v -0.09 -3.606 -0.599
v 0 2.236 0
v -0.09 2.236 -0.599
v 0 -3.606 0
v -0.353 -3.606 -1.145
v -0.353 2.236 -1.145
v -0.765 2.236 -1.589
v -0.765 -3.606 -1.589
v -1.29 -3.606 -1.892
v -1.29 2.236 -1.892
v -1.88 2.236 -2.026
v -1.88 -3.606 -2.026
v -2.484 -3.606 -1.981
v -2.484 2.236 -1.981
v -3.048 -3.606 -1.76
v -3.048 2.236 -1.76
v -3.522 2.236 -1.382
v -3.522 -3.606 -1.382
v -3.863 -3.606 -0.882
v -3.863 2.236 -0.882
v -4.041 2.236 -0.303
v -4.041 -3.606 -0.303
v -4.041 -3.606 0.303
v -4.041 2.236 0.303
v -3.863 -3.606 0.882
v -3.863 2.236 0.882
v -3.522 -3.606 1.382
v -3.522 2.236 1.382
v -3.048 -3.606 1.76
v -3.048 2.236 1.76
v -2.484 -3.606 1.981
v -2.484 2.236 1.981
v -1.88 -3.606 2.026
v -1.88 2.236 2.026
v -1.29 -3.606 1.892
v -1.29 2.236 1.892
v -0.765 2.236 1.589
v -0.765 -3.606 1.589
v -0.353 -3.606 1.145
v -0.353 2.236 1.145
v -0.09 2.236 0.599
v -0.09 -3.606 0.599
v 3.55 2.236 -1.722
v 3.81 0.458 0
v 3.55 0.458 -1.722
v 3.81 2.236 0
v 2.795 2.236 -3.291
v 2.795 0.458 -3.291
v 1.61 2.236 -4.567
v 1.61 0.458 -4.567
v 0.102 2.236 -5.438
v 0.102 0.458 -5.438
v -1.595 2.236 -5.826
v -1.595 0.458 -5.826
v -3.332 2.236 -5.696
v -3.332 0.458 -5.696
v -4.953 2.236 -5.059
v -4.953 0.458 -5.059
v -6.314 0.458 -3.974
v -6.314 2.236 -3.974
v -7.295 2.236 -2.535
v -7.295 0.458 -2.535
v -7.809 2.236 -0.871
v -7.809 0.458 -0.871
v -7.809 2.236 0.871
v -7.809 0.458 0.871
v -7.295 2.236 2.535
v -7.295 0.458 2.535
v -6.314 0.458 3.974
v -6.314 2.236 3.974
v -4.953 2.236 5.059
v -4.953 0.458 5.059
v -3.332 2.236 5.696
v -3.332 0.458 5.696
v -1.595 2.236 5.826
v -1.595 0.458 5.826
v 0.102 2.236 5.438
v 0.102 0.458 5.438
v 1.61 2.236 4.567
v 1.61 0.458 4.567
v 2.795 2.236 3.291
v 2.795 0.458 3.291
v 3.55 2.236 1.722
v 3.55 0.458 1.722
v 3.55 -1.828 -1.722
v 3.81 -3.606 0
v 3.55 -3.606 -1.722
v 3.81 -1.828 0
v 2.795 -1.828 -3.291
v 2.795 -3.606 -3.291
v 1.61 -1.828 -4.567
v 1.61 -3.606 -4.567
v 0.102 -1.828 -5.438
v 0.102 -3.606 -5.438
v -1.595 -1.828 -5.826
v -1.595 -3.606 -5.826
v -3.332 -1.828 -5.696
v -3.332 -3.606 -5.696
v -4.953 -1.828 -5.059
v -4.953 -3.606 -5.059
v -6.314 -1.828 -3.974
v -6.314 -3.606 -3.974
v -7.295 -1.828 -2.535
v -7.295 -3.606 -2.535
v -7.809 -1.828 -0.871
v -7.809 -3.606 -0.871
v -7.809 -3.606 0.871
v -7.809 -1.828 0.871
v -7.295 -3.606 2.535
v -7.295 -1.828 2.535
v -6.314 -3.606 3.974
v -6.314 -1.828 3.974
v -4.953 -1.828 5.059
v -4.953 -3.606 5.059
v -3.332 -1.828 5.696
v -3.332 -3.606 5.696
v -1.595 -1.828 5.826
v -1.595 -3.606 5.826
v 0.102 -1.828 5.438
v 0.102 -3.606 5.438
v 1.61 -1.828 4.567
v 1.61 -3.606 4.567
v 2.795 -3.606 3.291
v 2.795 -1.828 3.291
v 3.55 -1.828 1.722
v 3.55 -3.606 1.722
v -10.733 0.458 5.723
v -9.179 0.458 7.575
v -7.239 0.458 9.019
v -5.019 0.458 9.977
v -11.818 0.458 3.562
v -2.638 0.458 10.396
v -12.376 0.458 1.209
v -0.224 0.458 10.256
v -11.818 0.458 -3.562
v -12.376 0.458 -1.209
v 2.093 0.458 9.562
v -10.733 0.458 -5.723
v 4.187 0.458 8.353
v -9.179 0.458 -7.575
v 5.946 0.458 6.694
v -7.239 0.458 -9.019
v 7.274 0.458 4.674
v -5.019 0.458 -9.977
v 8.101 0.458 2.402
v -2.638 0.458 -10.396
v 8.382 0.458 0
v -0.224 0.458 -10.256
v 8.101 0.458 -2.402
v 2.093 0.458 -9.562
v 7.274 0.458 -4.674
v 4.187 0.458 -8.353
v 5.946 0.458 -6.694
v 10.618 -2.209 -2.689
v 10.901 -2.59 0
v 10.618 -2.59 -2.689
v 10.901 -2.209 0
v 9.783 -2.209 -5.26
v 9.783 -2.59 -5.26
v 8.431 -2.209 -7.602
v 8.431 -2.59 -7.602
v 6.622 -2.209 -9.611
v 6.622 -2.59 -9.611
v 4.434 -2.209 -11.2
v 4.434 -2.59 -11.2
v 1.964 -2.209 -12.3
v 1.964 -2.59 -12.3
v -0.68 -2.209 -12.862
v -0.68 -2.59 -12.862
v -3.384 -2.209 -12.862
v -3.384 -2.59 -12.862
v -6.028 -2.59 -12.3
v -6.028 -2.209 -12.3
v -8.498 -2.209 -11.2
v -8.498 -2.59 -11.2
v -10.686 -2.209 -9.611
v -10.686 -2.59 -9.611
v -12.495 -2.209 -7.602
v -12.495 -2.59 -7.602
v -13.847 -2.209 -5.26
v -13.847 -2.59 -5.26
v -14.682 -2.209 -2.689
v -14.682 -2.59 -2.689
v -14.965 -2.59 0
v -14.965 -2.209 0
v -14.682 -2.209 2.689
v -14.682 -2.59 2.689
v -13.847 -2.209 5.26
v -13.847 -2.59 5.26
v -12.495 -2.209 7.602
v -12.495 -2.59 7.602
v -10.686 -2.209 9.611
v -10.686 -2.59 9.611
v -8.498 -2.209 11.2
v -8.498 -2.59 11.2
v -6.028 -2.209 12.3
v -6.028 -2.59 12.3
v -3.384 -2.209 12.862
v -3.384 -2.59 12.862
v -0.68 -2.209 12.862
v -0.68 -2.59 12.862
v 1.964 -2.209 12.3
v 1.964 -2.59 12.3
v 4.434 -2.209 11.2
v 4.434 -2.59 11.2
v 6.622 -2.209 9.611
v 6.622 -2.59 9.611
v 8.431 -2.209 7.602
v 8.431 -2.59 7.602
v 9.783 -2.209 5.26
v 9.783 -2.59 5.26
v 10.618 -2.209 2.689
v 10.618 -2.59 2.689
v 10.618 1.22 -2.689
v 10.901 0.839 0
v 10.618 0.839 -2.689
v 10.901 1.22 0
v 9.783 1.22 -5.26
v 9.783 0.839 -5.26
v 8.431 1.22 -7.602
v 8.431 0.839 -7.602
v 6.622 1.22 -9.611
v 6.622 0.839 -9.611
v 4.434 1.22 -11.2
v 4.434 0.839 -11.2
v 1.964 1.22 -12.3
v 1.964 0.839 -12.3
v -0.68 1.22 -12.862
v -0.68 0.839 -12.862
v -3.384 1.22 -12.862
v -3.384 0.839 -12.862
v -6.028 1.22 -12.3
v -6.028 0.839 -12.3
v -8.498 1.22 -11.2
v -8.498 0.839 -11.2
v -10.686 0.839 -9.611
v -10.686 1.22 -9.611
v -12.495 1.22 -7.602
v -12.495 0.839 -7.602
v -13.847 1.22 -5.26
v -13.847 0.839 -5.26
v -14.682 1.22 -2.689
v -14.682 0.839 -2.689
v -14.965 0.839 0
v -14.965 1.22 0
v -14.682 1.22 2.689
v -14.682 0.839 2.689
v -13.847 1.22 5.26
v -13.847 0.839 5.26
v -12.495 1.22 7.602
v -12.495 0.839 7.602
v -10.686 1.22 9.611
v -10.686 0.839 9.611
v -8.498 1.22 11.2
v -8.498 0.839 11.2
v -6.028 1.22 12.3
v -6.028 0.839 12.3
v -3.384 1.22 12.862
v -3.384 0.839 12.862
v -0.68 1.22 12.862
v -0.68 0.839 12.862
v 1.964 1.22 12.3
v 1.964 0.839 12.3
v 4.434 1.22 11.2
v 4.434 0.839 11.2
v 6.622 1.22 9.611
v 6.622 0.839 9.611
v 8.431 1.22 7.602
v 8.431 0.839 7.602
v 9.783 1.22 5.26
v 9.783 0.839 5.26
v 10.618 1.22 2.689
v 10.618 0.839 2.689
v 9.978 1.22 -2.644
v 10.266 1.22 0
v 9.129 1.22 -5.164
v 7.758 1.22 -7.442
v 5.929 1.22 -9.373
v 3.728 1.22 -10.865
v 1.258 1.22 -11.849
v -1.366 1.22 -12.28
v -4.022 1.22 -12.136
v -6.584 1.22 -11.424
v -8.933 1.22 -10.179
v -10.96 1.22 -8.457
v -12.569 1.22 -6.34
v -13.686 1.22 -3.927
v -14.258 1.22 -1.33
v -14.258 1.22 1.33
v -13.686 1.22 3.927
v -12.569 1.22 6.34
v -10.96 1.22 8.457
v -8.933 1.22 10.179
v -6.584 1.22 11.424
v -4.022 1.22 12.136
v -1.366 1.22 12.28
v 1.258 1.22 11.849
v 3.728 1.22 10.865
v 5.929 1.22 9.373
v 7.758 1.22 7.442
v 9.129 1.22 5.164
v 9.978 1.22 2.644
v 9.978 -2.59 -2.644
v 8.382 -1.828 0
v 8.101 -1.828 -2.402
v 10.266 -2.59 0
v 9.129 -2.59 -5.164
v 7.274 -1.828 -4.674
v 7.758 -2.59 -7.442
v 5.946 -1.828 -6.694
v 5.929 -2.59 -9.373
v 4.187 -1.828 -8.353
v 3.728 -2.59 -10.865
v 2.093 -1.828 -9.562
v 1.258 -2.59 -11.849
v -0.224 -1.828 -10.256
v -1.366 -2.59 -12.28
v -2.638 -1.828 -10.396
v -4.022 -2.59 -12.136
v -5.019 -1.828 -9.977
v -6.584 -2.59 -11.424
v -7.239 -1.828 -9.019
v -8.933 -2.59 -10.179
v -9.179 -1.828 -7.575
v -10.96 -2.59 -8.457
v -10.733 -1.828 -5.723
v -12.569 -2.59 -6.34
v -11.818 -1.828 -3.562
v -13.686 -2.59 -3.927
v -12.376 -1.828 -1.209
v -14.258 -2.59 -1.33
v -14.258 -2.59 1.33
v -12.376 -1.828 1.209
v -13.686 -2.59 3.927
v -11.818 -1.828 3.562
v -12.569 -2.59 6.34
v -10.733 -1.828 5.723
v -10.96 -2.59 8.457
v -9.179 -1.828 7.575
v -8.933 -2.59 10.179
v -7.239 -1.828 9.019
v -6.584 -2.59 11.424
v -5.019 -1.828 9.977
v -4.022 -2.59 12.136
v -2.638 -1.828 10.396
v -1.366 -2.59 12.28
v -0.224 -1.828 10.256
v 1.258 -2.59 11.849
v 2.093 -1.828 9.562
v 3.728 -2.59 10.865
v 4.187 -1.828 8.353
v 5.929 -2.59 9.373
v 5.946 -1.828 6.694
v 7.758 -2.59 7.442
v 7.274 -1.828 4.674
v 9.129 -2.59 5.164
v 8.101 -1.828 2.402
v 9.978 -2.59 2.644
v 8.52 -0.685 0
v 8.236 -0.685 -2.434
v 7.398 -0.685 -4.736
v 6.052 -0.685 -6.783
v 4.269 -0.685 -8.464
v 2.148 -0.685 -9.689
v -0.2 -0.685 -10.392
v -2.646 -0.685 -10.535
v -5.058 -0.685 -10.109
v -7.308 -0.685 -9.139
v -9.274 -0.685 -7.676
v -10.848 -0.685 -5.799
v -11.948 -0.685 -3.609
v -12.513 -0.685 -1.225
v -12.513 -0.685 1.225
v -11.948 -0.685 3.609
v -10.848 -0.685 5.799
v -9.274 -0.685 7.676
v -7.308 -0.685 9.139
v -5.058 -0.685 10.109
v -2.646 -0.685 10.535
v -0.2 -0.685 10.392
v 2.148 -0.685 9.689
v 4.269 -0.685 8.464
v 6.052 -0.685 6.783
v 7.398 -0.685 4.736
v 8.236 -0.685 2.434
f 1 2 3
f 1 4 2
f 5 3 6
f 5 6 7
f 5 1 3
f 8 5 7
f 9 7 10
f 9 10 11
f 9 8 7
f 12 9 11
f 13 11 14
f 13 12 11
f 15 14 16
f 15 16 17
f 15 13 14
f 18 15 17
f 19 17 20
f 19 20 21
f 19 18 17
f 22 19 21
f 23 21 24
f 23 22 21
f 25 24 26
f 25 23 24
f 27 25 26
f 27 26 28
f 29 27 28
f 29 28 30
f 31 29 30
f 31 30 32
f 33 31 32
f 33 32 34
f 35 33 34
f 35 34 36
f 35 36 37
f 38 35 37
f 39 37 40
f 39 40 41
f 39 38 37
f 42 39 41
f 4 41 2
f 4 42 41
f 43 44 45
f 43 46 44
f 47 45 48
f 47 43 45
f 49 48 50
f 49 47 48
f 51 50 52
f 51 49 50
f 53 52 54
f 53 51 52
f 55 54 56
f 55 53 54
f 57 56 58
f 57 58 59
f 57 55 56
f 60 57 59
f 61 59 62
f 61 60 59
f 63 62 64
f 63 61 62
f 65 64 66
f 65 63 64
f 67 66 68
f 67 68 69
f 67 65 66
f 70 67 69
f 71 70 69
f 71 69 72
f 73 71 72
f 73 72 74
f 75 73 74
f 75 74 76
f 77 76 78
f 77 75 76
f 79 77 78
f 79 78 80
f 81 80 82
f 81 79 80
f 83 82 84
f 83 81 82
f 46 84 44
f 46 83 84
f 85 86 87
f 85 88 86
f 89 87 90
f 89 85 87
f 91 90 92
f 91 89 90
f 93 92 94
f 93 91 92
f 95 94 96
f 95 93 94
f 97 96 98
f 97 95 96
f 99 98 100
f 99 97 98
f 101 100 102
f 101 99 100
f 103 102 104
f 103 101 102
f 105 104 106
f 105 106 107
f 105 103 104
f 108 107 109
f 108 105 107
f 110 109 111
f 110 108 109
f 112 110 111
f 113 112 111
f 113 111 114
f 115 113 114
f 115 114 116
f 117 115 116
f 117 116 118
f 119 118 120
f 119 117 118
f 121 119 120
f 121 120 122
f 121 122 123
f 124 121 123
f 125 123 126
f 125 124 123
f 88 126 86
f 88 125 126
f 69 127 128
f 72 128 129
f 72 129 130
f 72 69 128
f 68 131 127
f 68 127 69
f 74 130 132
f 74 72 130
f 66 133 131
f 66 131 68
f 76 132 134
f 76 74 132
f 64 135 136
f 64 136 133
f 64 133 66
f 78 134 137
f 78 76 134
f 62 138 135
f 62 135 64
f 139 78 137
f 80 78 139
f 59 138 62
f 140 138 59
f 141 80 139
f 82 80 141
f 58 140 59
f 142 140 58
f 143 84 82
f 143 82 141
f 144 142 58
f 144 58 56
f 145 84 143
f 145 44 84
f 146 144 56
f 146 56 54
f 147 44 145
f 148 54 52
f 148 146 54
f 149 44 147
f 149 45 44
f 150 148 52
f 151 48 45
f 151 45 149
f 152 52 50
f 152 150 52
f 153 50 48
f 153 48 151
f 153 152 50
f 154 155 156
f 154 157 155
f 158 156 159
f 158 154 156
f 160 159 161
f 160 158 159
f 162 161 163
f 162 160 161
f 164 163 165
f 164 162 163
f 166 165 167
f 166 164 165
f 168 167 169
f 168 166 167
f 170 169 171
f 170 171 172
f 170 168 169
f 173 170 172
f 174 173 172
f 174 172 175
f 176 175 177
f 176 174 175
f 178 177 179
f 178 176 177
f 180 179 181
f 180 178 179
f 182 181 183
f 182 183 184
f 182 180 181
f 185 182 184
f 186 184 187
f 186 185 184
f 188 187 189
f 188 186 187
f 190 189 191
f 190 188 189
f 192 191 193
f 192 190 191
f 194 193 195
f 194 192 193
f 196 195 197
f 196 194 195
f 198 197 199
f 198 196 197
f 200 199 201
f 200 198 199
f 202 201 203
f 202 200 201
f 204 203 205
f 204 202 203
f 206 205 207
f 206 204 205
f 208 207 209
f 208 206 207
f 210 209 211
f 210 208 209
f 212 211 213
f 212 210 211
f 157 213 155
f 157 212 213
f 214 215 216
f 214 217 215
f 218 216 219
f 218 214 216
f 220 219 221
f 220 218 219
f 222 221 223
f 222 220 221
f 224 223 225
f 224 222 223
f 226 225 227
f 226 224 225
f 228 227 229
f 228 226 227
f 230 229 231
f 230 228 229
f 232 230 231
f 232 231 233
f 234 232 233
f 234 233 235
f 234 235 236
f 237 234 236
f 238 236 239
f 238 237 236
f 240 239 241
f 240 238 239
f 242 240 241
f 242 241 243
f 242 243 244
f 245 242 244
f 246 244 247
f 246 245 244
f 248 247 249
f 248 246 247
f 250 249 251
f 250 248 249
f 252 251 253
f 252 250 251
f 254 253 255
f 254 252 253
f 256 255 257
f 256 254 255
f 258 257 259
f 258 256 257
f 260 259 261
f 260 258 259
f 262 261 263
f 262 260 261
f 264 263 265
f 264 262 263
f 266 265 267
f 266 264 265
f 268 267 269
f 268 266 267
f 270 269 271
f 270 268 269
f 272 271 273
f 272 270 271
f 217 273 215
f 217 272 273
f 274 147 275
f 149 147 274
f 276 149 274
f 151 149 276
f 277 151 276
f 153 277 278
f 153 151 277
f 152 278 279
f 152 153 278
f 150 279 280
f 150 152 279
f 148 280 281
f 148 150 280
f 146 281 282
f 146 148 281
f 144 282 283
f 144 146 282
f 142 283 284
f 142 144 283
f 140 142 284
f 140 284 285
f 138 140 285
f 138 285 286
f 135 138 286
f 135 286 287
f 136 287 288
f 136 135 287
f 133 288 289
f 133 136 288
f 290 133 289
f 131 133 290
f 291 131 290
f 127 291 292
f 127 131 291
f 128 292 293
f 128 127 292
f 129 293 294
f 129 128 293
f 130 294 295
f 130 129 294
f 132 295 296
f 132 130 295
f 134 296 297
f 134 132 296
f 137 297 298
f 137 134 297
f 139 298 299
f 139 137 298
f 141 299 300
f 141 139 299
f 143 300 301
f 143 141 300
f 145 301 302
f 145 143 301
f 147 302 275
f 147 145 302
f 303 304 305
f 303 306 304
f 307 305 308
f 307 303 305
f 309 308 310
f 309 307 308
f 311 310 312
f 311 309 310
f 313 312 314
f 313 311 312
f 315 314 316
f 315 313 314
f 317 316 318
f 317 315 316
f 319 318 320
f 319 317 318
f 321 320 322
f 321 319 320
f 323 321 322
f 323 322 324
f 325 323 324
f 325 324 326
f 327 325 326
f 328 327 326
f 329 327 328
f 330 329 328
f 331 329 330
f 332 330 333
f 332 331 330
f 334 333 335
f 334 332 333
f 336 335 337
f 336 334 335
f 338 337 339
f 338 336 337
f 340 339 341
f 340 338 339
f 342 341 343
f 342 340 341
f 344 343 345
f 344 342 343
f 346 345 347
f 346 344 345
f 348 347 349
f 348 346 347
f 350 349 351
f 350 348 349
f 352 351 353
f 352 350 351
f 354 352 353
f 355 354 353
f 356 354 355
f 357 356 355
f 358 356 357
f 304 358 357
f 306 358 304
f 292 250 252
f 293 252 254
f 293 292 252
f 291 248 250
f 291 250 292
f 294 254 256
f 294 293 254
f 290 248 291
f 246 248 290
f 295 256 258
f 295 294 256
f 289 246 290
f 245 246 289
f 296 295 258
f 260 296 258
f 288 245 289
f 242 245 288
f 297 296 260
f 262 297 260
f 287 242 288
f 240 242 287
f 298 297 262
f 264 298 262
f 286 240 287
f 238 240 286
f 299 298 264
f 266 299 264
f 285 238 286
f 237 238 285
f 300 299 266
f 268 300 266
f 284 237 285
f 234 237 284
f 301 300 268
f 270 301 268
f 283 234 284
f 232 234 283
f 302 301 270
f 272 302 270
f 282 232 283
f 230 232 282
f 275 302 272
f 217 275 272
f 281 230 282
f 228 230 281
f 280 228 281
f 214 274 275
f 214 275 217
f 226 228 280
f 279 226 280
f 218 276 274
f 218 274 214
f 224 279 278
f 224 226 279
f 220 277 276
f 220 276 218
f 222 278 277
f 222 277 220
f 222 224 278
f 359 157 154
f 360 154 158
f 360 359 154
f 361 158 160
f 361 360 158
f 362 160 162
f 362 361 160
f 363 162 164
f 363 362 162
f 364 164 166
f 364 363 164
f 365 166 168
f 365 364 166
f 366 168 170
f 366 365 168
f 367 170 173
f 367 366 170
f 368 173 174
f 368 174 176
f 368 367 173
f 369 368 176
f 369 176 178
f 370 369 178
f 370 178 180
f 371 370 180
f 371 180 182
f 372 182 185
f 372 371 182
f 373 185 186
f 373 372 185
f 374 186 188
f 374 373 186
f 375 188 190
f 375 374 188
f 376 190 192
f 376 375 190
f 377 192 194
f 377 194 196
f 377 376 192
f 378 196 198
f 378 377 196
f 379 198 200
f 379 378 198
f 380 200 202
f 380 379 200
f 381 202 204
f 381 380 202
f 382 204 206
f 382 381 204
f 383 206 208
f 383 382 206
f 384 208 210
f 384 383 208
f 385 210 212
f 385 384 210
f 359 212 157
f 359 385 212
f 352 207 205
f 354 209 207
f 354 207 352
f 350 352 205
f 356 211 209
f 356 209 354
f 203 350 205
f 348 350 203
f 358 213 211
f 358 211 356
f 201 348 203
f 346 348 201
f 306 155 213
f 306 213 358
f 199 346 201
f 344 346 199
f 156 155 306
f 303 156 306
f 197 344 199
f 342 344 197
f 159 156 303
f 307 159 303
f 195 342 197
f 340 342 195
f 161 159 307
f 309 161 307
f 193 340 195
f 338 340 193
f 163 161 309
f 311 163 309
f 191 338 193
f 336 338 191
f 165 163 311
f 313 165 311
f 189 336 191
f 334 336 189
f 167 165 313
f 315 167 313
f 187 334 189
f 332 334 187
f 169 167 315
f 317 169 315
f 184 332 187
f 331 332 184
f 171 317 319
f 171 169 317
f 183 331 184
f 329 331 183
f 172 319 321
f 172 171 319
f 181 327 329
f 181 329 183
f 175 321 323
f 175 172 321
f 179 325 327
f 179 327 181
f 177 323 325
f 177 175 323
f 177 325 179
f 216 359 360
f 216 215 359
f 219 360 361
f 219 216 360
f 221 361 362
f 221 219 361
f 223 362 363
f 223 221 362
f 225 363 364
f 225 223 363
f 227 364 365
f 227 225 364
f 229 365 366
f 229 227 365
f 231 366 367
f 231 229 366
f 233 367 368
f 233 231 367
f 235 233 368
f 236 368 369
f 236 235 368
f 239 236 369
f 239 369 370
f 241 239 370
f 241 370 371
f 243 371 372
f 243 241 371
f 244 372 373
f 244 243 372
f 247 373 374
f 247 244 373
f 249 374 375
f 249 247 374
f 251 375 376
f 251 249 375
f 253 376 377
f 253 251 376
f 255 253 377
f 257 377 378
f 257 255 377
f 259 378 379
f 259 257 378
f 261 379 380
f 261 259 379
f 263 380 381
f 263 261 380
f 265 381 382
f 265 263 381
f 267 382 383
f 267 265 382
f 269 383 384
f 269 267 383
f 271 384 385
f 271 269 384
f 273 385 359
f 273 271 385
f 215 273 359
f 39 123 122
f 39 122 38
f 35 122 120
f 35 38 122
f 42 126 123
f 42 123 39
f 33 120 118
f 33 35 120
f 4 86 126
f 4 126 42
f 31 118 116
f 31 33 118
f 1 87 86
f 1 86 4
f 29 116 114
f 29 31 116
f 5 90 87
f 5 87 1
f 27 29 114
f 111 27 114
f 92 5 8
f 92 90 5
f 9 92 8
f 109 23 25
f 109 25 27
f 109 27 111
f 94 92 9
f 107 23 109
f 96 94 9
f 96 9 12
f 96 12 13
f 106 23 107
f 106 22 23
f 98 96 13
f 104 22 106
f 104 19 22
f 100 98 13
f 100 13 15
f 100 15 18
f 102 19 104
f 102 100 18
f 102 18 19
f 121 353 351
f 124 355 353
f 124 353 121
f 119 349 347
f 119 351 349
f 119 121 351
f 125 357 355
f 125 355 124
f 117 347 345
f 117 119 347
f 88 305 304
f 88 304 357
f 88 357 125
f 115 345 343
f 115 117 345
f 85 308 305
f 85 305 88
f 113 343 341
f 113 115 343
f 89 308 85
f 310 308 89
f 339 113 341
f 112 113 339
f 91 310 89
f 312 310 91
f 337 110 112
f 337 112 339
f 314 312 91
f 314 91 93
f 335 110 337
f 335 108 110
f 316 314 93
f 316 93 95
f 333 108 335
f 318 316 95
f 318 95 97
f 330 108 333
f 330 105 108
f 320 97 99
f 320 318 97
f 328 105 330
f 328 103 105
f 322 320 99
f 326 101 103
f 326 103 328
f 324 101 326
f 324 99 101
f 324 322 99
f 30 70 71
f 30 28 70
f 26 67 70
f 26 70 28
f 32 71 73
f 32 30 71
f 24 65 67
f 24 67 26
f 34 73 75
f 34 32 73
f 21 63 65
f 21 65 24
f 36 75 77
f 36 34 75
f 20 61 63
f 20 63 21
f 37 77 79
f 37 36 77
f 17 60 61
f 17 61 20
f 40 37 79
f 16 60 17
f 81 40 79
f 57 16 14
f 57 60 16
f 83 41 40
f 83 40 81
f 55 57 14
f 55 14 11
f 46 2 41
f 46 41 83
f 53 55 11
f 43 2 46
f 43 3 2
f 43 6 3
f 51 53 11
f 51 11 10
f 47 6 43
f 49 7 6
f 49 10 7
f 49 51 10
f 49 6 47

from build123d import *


with BuildPart() as part:
    # Sketch1 → Revolution1 (revolve)
    with BuildSketch(Plane.XY):
        Polygon((3.81, -1.828307296), (3.81, 0.457692704), (3.81, 2.235692704), (0, 2.235692704), (0, -3.606307296), (3.81, -3.606307296), align=None)
        Polygon((8.382, 0.457692704), (3.81, 0.457692704), (3.81, -1.828307296), (8.382, -1.828307296), (10.265714416, -2.590307296), (10.900714416, -2.590307296), (10.900714416, -2.209307296), (8.520461423, -0.685307296), (10.900714416, 0.838692704), (10.900714416, 1.219692704), (10.265714416, 1.219692704), align=None)
    revolve(axis=Axis((-2.032, -2.54, 0), (0, 1, 0)))


solid = part.part
